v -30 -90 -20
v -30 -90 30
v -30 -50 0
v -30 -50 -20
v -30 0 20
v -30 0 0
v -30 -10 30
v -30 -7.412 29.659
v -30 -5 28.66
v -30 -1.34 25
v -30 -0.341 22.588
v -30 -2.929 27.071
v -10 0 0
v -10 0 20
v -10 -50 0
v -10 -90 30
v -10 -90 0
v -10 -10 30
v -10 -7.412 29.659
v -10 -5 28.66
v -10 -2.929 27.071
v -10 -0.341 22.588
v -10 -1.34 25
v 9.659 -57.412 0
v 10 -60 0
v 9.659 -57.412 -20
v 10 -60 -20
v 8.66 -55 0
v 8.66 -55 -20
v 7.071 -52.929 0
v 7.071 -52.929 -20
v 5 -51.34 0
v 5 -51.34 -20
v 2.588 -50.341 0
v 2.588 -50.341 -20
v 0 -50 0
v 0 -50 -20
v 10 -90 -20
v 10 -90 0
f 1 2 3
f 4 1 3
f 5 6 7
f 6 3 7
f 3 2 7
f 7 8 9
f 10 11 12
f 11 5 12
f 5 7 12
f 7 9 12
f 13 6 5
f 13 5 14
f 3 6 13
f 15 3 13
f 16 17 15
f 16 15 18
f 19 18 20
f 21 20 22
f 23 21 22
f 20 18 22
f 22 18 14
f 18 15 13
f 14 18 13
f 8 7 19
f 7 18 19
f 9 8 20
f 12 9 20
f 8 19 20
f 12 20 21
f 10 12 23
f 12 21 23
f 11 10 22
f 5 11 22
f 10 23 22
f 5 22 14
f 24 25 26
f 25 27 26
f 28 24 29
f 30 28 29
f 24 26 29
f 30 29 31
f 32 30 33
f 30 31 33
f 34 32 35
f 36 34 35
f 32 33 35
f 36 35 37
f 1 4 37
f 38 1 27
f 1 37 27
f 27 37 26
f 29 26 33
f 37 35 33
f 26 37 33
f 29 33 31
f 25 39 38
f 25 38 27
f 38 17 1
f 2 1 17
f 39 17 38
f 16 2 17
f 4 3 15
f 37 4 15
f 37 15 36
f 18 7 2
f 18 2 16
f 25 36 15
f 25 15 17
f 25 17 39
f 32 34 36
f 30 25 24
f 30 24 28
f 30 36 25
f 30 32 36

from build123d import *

# Parameters (mm, degrees)
SKETCH1_W           = 20
SKETCH1_H           = 90
BOSS_EXTRUDE1_DEPTH = 30
SKETCH2_W           = 40
SKETCH2_H           = 40
BOSS_EXTRUDE2_DEPTH = 20
FILLET1_R           = 10


with BuildPart() as part:
    # Sketch1 → Boss-Extrude1 (new body)
    with BuildSketch(Plane.XY):
        with Locations((-20, -45)):
            Rectangle(SKETCH1_W, SKETCH1_H)
    extrude(amount=BOSS_EXTRUDE1_DEPTH)

    # Sketch2 → Boss-Extrude2 (add)
    with BuildSketch(Plane.XY):
        with Locations((-10, -70)):
            Rectangle(SKETCH2_W, SKETCH2_H)
    extrude(amount=-BOSS_EXTRUDE2_DEPTH)

    # Fillet1
    fillet1_edges = [part.edges().sort_by_distance(p)[0] for p in [
        (10, -50, -10),
        (-20, 0, 30),
    ]]
    fillet(fillet1_edges, radius=FILLET1_R)


solid = part.part
